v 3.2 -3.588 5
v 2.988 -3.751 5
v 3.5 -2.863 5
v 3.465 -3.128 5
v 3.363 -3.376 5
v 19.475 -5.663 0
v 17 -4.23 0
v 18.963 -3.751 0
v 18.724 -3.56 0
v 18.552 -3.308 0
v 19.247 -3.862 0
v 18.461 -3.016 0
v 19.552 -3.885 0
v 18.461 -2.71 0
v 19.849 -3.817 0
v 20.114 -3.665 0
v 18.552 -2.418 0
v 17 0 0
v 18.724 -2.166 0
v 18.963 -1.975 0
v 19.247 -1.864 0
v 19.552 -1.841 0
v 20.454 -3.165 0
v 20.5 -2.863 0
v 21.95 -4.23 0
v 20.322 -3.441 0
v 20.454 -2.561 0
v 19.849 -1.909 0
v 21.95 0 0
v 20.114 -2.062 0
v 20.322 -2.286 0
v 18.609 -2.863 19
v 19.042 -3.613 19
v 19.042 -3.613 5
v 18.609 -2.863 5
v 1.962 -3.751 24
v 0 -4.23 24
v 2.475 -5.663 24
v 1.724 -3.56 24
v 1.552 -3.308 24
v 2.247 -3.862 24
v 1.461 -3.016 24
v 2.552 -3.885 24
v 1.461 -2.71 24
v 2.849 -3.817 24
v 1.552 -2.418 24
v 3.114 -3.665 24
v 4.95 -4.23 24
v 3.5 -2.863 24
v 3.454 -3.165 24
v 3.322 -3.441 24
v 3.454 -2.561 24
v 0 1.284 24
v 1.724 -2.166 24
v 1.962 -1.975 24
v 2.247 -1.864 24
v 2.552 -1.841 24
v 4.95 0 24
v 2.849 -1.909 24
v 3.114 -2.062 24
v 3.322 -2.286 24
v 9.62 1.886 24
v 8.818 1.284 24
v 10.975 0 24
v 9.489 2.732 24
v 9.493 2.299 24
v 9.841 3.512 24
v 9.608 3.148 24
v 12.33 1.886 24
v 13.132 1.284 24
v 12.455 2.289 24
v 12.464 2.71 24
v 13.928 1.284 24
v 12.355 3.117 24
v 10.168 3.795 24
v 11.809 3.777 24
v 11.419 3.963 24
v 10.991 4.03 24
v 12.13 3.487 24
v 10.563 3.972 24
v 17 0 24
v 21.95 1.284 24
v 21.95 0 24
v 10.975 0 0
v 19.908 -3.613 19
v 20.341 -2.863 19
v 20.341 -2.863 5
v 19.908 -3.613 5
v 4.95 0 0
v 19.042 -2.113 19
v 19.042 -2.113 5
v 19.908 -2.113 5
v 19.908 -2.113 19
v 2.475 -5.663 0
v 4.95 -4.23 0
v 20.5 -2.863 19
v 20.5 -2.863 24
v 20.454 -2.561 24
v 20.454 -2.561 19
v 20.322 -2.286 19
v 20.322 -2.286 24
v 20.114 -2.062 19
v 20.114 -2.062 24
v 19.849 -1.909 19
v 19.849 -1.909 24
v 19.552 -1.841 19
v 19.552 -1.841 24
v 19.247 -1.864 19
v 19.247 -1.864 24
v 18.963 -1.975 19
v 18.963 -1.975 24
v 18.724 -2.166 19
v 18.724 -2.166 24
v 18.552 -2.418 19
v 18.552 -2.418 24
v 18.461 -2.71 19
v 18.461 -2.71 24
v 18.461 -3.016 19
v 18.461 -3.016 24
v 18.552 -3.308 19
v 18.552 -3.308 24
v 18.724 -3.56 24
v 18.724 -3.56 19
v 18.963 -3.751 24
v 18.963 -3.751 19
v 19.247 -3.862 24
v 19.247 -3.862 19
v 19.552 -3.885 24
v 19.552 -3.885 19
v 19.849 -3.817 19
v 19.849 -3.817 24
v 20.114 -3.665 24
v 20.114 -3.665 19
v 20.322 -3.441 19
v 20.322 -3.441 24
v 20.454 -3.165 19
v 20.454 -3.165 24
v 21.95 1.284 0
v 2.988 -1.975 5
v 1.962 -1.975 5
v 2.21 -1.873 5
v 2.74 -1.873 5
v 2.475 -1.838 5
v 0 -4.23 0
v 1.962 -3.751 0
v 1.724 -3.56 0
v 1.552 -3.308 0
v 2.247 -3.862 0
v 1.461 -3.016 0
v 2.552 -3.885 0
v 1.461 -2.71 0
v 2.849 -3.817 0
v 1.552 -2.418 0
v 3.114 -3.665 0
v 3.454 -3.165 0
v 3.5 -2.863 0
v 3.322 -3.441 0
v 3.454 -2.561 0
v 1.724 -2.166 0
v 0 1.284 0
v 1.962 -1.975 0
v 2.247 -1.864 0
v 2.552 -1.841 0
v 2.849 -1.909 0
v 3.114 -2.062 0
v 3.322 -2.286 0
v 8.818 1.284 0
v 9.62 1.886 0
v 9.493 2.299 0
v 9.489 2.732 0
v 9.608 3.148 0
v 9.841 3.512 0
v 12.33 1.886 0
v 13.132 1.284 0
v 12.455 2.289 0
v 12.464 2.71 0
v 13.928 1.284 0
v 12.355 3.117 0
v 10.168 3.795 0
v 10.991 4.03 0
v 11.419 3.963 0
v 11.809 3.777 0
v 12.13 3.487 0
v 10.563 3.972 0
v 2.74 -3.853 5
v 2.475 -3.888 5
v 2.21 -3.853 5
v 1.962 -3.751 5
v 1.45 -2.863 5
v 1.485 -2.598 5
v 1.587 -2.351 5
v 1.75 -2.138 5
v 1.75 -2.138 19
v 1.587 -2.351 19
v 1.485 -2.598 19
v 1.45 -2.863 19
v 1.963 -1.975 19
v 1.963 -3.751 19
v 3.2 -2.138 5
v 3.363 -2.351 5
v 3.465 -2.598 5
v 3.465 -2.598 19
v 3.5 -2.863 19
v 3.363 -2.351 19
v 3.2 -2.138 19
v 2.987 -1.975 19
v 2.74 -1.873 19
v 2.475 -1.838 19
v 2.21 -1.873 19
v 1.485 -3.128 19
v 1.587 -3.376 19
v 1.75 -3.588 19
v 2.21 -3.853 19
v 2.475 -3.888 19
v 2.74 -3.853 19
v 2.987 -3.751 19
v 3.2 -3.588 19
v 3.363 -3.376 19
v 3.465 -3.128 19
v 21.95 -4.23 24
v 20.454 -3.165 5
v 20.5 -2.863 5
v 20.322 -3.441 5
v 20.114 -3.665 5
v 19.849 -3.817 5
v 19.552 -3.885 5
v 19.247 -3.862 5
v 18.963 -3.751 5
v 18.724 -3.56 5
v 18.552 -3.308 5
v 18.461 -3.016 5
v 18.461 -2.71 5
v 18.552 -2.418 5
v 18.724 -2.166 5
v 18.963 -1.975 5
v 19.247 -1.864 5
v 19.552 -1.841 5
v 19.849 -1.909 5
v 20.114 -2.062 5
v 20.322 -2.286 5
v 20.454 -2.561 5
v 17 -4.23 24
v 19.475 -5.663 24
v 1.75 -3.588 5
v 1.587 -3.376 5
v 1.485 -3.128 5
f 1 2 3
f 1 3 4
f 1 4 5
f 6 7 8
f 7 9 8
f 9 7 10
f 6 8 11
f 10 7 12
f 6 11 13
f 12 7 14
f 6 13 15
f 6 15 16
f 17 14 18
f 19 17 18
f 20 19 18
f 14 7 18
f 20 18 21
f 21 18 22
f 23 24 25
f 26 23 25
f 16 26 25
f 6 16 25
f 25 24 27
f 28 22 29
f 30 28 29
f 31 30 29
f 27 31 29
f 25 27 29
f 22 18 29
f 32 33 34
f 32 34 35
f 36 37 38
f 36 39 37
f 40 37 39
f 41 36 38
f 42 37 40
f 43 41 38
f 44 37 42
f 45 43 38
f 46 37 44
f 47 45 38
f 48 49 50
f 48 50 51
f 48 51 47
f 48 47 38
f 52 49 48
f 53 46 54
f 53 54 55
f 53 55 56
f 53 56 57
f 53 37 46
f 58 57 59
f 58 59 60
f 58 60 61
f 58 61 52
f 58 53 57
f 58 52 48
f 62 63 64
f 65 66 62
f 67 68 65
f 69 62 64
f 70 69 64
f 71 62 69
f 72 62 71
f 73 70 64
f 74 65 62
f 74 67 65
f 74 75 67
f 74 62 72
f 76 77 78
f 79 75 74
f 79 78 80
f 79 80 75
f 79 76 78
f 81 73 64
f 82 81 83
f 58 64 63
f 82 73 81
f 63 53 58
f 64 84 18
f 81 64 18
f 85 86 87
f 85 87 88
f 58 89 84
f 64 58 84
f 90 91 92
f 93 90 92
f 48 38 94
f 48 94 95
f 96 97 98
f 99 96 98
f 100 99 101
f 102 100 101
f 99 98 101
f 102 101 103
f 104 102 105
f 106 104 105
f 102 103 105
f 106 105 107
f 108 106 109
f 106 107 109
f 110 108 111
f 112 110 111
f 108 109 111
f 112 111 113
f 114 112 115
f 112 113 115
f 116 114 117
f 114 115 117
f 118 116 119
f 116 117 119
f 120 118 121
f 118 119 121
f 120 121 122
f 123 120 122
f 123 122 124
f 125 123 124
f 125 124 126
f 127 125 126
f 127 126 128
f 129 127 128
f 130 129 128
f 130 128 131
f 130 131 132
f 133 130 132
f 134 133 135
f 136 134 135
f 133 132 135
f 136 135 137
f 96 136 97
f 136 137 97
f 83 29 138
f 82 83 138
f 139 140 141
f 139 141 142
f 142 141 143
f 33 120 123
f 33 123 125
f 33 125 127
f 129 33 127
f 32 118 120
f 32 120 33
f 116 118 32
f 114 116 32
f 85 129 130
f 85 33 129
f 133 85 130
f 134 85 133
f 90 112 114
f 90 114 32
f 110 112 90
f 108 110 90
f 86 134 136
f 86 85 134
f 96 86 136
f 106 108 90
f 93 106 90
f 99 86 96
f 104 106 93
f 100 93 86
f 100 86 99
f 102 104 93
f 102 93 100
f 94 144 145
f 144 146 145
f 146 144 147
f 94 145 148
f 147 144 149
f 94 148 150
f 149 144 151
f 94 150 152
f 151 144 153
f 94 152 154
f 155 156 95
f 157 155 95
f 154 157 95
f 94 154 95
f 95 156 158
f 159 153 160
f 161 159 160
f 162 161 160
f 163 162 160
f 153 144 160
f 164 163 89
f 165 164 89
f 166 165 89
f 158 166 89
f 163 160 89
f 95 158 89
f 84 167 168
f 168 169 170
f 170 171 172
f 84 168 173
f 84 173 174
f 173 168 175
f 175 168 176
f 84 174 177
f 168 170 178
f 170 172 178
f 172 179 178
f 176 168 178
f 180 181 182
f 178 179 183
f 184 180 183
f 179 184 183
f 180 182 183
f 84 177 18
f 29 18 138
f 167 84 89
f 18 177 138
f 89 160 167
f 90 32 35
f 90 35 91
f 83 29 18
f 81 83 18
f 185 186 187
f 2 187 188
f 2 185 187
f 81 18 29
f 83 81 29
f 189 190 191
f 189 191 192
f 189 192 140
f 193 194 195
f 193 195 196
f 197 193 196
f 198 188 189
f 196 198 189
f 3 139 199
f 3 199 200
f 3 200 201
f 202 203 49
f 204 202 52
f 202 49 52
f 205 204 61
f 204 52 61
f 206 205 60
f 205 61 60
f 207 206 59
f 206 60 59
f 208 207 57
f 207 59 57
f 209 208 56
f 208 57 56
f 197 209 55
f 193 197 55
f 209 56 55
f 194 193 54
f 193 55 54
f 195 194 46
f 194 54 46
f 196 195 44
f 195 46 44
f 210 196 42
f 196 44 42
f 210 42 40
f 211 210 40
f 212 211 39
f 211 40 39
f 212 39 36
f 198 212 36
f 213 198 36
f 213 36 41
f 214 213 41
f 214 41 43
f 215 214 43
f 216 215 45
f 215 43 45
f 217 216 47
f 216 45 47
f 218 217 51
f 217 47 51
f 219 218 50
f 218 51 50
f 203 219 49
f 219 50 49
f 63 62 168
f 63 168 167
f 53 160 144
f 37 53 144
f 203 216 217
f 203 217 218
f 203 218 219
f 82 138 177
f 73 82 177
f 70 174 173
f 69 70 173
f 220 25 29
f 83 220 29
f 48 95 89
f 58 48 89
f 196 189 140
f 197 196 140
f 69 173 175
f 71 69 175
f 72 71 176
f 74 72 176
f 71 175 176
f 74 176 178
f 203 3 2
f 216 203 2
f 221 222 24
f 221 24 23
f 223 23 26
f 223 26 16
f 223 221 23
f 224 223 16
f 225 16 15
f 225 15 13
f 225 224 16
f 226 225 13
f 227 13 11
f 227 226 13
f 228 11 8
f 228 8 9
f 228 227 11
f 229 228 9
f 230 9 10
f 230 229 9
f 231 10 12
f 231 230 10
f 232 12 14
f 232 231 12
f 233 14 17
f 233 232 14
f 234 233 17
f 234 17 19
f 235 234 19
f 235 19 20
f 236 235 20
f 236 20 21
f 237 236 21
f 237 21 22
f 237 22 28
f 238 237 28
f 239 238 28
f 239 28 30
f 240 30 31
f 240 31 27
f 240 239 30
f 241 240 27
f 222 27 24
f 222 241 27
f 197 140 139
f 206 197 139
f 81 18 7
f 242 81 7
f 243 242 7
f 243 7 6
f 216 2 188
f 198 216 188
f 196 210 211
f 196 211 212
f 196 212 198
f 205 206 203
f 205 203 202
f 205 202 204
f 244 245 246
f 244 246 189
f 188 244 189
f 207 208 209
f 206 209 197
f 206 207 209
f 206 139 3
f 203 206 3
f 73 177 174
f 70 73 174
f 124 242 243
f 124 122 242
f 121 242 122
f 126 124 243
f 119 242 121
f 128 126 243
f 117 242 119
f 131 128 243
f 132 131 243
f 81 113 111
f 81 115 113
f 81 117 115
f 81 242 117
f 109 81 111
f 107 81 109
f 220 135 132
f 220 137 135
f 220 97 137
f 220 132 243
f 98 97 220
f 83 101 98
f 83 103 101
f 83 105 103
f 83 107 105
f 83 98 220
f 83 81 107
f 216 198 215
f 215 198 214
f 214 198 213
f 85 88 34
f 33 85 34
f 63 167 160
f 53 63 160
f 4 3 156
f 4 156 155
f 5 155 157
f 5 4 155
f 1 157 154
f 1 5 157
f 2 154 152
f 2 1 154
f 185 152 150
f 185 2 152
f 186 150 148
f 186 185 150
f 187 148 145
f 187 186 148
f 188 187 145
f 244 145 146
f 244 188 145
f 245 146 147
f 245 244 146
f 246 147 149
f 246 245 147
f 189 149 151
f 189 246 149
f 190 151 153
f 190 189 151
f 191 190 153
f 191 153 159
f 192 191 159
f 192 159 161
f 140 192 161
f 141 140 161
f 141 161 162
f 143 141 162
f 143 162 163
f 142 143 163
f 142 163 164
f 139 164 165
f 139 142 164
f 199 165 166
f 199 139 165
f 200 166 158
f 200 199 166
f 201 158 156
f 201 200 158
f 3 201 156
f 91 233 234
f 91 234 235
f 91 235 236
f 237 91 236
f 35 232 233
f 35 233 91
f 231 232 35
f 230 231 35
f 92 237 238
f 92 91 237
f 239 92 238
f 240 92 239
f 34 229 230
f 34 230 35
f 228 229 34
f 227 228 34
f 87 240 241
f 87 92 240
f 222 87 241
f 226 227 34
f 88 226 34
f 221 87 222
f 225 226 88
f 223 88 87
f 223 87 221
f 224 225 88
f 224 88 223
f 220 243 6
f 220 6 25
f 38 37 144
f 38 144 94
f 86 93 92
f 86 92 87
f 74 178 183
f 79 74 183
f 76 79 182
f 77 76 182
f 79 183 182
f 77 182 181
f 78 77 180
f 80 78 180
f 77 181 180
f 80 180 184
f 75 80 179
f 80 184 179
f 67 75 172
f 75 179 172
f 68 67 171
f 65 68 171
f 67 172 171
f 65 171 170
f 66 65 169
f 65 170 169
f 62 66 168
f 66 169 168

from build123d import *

# Parameters (mm, degrees)
BOSS_EXTRUDE2_DEPTH   = 24
BOSS_EXTRUDE2_2_DEPTH = 24
SKETCH6_R             = 1.025
CUT_EXTRUDE1_DEPTH    = 5
CUT_EXTRUDE2_START    = -5
SKETCH7_R             = 1.025
CUT_EXTRUDE2_DEPTH    = 5
CUT_EXTRUDE4_DEPTH    = 7000


with BuildPart() as part:
    # Sketch3 → Boss-Extrude2 (new body)
    with BuildSketch(Plane.XY):
        with BuildLine():
            Line((0, 1.284473501), (0, -4.23))
            Line((0, -4.23), (2.475, -5.663169564))
            Line((2.475, -5.663169564), (4.95, -4.23))
            Line((4.95, -4.23), (4.95, 0))
            Line((4.95, 0), (10.974918748, 0))
            Line((10.974918748, 0), (17, -0.000257875))
            Line((17, -0.000257875), (17, 0))
            Line((17, 0), (21.949837505, 0))
            Line((21.949837505, 0), (21.949892461, 1.28400377))
            Line((21.949892461, 1.28400377), (13.928131848, 1.284347104))
            Line((13.928131848, 1.284347104), (13.13155756, 1.284381197))
            Line((13.13155756, 1.284381197), (12.329651428, 1.886055123))
            ThreePointArc((12.329651428, 1.886055123), (12.474649771, 2.499007586), (12.355214929, 3.117449627))
            ThreePointArc((12.355214929, 3.117449627), (10.359172253, 3.897908673), (9.620266793, 1.886113105))
            Line((9.620266793, 1.886113105), (8.81833491, 1.284473501))
            Line((8.81833491, 1.284473501), (0, 1.284473501))
        make_face()
    extrude(amount=BOSS_EXTRUDE2_DEPTH)


with BuildPart() as body_2:
    # Sketch3 → Boss-Extrude2 2 (new body)
    with BuildSketch(Plane.XY):
        Polygon((21.949837485, -0.00046973), (17, -0.000257875), (17, -4.23), (19.475, -5.663169564), (21.95, -4.23), (21.95, 0), (21.949837505, 0), align=None)
    extrude(amount=BOSS_EXTRUDE2_2_DEPTH)


with BuildPart() as cut_extrude1_tool:
    # Sketch6 → Cut-Extrude1 (new body)
    with BuildSketch(Plane.XY.offset(24)):
        with Locations((2.475, -2.863169564)):
            Circle(SKETCH6_R)
        with Locations((19.475, -2.863169564)):
            Circle(SKETCH6_R)
    extrude(amount=-CUT_EXTRUDE1_DEPTH)


with BuildPart() as part_1:
    add(part.part)

    # Cut-Extrude1: cut by cut_extrude1_tool
    add(cut_extrude1_tool.part, mode=Mode.SUBTRACT)


with BuildPart() as body_2_1:
    add(body_2.part)

    # Cut-Extrude1: cut by cut_extrude1_tool
    add(cut_extrude1_tool.part, mode=Mode.SUBTRACT)


with BuildPart() as cut_extrude2_tool:
    # Sketch7 → Cut-Extrude2 (new body)
    with BuildSketch(Plane(origin=(0, 0, 0), x_dir=(-1, 0, 0), z_dir=(0, 0, -1)).offset(CUT_EXTRUDE2_START)):
        with Locations(Location((-19.475, -2.863169564, 0), (0, 0, 180))):
            Circle(SKETCH7_R)
        with Locations(Location((-2.475, -2.863169564, 0), (0, 0, 180))):
            Circle(SKETCH7_R)
    extrude(amount=CUT_EXTRUDE2_DEPTH)


with BuildPart() as part_2:
    add(part_1.part)

    # Cut-Extrude2: cut by cut_extrude2_tool
    add(cut_extrude2_tool.part, mode=Mode.SUBTRACT)


with BuildPart() as body_2_2:
    add(body_2_1.part)

    # Cut-Extrude2: cut by cut_extrude2_tool
    add(cut_extrude2_tool.part, mode=Mode.SUBTRACT)


with BuildPart() as cut_extrude4_tool:
    # Sketch8 → Cut-Extrude4 (new body)
    with BuildSketch(Plane(origin=(0, 0, 5), x_dir=(-1, 0, 0), z_dir=(0, 0, -1))):
        Polygon((-18.608974596, -2.863169564), (-19.041987298, -2.113169564), (-19.908012702, -2.113169564), (-20.341025404, -2.863169564), (-19.908012702, -3.613169564), (-19.041987298, -3.613169564), align=None)
        Polygon((-1.45, -2.863169564), (-1.9625, -1.975493525), (-2.9875, -1.975493525), (-3.5, -2.863169564), (-2.9875, -3.750845603), (-1.9625, -3.750845603), align=None)
    extrude(amount=-CUT_EXTRUDE4_DEPTH)


with BuildPart() as part_3:
    add(part_2.part)

    # Cut-Extrude4: cut by cut_extrude4_tool
    add(cut_extrude4_tool.part, mode=Mode.SUBTRACT)


with BuildPart() as body_2_3:
    add(body_2_2.part)

    # Cut-Extrude4: cut by cut_extrude4_tool
    add(cut_extrude4_tool.part, mode=Mode.SUBTRACT)


solid = Compound([part_3.part, body_2_3.part])
